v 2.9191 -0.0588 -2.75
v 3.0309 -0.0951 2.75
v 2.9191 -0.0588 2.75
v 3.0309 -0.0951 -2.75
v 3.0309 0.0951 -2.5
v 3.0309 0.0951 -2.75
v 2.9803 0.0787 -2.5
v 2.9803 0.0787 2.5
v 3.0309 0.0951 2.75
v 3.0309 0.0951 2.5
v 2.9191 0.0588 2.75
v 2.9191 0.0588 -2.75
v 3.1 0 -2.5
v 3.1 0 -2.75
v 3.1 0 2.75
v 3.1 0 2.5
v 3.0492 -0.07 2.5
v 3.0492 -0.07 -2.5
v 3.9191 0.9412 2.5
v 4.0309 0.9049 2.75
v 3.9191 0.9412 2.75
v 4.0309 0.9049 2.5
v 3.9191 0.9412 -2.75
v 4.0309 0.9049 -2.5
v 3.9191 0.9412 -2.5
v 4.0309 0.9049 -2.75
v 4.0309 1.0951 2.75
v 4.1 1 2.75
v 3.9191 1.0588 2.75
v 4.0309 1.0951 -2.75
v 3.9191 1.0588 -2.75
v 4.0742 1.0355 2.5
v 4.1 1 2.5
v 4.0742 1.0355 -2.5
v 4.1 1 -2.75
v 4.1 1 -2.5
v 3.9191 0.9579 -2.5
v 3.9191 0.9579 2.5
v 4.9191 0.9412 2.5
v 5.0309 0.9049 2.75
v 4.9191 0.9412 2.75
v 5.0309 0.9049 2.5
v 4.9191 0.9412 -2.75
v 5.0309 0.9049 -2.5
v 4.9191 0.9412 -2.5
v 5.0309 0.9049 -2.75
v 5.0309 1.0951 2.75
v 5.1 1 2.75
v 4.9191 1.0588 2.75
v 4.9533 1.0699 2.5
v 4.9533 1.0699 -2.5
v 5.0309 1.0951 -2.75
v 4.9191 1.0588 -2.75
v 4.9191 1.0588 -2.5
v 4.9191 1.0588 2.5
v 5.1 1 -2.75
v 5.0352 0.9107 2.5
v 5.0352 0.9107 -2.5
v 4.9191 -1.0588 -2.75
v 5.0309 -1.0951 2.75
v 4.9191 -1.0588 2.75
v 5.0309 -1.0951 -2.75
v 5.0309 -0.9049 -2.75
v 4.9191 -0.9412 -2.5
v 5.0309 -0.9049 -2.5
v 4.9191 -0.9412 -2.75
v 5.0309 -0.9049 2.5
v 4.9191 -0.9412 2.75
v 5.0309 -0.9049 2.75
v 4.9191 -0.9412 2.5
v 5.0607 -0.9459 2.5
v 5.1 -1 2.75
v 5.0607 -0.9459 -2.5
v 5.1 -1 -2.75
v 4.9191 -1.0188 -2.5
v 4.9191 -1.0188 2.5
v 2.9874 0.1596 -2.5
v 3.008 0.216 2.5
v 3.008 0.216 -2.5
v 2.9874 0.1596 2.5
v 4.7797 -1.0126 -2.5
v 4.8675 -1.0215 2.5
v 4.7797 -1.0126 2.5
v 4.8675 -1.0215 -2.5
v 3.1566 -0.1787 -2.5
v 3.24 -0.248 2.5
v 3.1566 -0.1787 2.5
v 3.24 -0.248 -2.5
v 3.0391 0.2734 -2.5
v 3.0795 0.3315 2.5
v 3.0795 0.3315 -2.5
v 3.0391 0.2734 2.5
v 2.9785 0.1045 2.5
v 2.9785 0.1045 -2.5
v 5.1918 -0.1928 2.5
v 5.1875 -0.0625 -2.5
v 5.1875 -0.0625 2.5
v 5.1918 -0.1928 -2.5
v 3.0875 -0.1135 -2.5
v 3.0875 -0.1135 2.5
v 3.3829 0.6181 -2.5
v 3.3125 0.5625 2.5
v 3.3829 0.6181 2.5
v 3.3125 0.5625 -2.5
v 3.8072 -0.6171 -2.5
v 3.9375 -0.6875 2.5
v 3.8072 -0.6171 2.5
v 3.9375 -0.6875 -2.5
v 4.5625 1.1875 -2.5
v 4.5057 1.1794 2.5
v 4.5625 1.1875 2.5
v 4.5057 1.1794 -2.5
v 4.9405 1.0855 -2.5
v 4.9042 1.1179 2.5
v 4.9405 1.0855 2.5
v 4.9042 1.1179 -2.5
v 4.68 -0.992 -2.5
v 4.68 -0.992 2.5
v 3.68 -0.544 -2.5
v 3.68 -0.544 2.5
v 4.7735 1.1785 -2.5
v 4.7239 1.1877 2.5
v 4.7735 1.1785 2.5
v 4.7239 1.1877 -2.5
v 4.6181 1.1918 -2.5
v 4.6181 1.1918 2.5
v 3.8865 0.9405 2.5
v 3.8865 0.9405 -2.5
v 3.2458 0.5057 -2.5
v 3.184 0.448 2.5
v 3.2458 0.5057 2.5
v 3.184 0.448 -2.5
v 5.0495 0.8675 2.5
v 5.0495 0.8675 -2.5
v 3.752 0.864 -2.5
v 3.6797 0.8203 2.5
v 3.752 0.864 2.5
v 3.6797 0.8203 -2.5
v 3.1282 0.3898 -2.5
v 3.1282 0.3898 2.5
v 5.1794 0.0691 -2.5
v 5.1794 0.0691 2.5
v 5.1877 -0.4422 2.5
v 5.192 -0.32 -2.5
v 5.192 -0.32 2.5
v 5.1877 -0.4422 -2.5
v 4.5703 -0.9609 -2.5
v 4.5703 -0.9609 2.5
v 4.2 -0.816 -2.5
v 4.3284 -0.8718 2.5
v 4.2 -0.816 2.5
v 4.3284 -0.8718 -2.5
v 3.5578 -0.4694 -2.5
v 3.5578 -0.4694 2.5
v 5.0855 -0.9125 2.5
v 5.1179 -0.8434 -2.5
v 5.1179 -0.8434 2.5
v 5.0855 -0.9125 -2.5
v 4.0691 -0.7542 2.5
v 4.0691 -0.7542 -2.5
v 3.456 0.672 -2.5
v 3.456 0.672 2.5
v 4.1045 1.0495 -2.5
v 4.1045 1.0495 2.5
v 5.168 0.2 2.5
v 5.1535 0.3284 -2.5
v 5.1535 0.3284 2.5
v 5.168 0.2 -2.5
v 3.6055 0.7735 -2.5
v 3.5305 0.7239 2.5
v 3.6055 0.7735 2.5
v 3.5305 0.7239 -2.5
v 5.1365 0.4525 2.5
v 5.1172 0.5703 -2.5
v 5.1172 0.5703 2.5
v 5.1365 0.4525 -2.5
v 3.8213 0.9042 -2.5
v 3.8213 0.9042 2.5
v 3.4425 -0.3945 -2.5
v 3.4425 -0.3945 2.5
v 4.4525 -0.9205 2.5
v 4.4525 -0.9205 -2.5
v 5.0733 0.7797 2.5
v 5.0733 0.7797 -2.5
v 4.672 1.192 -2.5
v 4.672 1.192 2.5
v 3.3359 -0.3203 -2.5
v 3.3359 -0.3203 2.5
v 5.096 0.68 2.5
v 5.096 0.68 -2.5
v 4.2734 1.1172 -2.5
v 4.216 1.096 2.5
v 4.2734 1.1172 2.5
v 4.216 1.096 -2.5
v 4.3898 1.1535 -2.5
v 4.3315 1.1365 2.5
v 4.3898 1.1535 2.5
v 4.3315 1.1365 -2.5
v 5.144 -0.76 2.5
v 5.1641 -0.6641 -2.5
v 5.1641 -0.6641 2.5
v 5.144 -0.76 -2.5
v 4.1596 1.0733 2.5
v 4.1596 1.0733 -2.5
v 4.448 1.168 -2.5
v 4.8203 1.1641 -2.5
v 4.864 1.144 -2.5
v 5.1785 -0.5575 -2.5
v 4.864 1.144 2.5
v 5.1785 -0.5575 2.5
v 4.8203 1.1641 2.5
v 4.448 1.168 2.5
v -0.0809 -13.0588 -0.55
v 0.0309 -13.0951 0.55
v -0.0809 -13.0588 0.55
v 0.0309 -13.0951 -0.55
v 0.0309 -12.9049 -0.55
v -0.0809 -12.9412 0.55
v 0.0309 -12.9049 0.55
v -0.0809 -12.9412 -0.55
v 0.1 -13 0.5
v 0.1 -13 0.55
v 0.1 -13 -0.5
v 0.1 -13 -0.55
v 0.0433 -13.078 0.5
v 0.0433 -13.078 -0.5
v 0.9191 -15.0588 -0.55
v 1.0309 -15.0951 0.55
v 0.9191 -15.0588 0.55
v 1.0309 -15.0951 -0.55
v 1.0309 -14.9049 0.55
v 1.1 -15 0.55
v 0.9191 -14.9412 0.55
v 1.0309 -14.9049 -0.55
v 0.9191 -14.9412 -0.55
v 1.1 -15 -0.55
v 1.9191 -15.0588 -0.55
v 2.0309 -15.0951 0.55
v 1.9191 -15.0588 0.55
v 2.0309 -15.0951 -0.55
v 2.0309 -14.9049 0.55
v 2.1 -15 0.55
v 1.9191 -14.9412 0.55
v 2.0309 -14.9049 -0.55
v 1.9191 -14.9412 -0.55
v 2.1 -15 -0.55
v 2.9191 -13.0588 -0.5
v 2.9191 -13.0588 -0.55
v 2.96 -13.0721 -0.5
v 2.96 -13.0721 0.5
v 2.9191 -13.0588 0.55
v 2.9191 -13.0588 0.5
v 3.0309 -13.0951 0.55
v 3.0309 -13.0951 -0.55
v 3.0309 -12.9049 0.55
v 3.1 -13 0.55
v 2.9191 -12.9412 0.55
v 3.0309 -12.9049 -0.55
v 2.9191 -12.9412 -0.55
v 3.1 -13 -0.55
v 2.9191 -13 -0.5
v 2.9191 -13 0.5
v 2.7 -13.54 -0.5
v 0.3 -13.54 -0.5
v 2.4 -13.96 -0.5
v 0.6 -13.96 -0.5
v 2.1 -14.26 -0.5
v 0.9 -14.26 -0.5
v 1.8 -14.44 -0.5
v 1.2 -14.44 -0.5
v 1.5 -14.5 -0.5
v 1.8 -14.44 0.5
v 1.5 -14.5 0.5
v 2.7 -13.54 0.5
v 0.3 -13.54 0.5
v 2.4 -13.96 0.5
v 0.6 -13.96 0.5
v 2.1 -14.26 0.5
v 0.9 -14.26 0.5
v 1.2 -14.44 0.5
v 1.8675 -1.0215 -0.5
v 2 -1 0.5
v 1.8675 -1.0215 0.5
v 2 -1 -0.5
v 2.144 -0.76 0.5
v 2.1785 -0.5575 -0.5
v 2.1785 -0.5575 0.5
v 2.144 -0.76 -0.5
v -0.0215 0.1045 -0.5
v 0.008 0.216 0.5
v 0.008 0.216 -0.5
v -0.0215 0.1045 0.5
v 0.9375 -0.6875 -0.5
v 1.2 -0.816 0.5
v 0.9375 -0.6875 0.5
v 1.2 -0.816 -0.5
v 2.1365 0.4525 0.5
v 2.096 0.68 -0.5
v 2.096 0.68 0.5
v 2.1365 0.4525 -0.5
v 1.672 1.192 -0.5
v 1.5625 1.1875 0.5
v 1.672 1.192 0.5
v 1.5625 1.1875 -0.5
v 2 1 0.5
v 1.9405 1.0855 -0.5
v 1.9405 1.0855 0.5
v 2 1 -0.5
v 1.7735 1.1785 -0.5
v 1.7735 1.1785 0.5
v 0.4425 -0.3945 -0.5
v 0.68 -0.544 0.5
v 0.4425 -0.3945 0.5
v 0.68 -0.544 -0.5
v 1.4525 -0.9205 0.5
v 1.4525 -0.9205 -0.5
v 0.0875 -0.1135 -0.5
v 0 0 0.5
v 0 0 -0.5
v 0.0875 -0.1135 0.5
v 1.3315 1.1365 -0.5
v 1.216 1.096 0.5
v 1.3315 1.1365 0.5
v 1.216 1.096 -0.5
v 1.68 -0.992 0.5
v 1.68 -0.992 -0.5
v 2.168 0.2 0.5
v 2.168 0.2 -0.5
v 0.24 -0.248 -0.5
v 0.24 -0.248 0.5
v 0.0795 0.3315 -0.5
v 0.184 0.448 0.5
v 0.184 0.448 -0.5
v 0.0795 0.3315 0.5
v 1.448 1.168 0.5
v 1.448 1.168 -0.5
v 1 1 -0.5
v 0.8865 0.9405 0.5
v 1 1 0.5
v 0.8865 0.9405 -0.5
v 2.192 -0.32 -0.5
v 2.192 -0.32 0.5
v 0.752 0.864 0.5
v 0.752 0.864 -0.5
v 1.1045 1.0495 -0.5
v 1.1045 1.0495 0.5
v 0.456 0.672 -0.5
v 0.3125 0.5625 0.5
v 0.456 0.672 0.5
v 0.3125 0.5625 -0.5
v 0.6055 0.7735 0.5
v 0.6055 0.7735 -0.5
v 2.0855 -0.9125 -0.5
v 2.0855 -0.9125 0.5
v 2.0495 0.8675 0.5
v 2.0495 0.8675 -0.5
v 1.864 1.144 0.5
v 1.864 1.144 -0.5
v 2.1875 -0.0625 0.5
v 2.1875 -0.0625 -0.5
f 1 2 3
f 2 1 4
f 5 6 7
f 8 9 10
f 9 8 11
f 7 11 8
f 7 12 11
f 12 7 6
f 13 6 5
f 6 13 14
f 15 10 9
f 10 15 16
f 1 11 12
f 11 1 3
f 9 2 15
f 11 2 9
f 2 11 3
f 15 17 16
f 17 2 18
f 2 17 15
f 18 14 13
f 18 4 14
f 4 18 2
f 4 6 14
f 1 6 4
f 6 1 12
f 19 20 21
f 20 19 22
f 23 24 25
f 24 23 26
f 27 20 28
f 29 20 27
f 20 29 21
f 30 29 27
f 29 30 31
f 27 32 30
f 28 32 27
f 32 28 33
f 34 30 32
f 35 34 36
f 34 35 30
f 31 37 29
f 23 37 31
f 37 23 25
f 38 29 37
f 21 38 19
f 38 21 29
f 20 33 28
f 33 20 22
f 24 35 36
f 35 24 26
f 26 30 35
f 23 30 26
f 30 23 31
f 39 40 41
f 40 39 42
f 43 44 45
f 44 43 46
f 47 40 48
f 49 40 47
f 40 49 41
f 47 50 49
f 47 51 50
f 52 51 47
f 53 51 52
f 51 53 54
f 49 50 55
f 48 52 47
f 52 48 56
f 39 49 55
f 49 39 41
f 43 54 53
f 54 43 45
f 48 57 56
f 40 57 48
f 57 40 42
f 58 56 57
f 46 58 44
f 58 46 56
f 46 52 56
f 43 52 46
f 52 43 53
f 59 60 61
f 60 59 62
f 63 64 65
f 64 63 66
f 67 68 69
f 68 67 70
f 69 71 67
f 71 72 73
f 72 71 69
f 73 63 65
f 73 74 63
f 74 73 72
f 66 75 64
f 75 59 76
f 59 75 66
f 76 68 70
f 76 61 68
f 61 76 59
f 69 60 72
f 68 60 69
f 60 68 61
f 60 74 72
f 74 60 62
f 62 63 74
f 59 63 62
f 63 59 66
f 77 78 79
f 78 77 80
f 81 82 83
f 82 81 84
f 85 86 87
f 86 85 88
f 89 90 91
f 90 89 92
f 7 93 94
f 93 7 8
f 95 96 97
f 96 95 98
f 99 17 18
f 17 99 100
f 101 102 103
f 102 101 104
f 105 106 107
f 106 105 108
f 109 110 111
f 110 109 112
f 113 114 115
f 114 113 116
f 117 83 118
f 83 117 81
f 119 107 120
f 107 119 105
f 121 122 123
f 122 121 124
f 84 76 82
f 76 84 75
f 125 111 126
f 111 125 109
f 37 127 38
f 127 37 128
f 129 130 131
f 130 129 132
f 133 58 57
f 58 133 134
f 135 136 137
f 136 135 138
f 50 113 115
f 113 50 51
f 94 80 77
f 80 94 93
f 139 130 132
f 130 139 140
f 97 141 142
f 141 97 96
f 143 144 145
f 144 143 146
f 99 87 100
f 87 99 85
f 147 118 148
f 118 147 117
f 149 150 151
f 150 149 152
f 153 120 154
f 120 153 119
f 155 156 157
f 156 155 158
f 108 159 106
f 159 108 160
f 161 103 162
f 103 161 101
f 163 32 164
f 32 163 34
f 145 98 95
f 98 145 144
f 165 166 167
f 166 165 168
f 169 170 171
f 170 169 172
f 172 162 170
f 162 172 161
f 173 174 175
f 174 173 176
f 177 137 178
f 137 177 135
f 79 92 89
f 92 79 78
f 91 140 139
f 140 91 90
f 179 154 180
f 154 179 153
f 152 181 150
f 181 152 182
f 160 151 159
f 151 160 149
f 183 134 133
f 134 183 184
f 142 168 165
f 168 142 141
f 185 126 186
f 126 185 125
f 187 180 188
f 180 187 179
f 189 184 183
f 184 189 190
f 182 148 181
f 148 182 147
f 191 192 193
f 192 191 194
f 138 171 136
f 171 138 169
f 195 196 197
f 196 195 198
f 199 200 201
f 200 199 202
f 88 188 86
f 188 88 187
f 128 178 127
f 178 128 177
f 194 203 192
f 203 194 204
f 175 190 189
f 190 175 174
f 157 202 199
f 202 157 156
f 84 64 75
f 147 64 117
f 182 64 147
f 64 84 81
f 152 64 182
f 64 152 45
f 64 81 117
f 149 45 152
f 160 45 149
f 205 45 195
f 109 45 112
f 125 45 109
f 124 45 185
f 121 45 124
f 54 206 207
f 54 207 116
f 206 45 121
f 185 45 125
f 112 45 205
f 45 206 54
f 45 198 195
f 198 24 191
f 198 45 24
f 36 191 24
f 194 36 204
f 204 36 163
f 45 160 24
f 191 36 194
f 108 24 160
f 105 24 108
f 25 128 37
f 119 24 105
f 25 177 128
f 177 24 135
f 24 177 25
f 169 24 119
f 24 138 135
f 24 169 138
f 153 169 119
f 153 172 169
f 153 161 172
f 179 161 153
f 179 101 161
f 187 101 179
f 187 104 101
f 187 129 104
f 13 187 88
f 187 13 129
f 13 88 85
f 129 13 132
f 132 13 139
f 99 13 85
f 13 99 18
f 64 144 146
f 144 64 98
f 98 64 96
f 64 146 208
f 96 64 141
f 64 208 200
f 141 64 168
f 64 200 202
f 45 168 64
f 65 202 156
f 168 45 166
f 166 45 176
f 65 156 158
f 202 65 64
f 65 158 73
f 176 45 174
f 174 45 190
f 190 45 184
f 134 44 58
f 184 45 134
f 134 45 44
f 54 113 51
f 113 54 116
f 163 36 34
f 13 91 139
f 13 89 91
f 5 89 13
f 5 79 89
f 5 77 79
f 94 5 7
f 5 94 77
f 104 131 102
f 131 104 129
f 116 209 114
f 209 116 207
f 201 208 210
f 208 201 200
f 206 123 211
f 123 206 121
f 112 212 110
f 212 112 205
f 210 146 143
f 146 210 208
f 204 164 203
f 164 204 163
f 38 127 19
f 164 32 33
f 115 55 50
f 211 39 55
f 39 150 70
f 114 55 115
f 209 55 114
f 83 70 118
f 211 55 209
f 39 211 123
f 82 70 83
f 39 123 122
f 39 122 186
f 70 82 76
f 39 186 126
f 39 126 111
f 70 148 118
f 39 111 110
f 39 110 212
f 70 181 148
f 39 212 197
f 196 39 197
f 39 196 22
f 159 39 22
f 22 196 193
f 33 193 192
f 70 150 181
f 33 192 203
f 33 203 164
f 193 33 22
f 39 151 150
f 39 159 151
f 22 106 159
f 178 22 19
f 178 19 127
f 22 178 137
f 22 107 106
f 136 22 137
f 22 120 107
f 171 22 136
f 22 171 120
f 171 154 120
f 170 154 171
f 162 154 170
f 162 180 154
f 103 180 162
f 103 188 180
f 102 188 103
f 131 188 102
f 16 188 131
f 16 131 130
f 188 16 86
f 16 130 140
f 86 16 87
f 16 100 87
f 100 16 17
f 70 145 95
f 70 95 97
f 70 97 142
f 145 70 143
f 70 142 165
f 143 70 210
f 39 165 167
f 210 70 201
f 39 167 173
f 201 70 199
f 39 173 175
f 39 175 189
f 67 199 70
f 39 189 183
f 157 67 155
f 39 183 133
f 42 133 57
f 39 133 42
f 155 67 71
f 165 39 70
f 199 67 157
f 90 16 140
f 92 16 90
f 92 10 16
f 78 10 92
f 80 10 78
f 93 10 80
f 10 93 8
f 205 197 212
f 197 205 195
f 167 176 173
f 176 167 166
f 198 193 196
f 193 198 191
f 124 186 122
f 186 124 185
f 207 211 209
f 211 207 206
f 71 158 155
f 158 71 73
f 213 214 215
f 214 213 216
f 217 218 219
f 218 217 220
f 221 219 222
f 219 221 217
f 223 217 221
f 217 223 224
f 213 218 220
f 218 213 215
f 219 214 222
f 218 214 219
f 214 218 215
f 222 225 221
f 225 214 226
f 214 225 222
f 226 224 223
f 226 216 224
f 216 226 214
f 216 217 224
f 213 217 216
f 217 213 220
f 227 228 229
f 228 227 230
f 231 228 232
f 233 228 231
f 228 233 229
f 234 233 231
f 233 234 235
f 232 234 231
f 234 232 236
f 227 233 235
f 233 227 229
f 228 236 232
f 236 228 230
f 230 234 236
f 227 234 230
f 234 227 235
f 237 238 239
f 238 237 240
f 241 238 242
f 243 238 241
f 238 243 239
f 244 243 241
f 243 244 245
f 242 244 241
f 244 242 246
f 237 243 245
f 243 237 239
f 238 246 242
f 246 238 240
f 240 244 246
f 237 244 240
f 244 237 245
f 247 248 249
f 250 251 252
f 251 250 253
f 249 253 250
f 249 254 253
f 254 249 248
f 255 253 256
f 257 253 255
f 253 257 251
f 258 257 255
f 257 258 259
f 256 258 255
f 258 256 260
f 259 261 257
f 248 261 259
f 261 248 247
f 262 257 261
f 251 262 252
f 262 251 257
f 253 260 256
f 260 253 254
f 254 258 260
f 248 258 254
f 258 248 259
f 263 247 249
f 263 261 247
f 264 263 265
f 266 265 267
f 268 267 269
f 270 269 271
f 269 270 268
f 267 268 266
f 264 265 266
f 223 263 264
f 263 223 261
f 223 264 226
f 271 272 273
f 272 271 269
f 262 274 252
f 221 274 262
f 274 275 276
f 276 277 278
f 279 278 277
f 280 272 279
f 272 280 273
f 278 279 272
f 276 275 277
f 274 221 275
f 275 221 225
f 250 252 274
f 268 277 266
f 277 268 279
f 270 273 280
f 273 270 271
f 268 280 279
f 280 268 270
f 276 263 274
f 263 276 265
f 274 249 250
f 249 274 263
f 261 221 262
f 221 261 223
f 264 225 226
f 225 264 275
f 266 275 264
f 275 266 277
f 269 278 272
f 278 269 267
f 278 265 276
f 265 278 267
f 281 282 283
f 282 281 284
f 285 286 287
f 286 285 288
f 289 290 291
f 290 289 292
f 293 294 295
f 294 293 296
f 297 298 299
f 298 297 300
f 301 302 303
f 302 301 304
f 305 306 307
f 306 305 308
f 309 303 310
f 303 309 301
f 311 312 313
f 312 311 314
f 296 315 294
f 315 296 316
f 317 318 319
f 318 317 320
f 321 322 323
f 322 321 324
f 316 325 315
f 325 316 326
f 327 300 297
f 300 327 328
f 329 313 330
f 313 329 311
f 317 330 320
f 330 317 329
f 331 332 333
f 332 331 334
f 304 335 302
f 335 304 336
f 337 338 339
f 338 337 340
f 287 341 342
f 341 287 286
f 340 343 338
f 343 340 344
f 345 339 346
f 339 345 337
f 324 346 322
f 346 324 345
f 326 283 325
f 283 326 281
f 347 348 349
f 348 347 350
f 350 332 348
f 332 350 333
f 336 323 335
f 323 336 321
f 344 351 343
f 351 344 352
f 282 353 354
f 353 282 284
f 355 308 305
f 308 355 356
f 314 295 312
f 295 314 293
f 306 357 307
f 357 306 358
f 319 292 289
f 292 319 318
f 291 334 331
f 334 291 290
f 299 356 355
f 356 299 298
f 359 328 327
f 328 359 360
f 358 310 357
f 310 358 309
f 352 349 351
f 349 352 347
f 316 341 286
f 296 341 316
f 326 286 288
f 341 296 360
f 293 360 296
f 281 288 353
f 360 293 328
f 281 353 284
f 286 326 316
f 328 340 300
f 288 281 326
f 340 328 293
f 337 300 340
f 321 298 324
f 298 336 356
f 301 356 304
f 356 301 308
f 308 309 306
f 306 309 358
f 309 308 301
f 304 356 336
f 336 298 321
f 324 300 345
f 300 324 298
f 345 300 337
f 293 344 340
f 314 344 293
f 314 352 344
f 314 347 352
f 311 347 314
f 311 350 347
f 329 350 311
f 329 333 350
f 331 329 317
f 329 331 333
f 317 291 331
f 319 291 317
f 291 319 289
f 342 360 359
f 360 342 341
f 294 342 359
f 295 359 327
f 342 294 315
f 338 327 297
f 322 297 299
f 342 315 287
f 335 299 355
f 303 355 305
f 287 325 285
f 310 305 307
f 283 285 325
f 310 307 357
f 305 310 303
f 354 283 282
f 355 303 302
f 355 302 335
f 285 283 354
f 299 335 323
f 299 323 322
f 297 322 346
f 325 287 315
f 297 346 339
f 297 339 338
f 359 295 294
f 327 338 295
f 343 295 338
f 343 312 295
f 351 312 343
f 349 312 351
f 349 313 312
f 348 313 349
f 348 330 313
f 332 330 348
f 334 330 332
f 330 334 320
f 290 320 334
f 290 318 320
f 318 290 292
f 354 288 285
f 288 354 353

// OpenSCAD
// Generated by SolidPython 1.0.5 on 2021-06-01 16:29:02


union() {
	linear_extrude(center = true, height = 1) {
		polygon(points = [[0.0000000000, 0.0000000000], [-0.0215000000, 0.1045000000], [0.0080000000, 0.2160000000], [0.0795000000, 0.3315000000], [0.1840000000, 0.4480000000], [0.3125000000, 0.5625000000], [0.4560000000, 0.6720000000], [0.6055000000, 0.7735000000], [0.7520000000, 0.8640000000], [0.8865000000, 0.9405000000], [1.0000000000, 1.0000000000], [1.1045000000, 1.0495000000], [1.2160000000, 1.0960000000], [1.3315000000, 1.1365000000], [1.4480000000, 1.1680000000], [1.5625000000, 1.1875000000], [1.6720000000, 1.1920000000], [1.7735000000, 1.1785000000], [1.8640000000, 1.1440000000], [1.9405000000, 1.0855000000], [2.0000000000, 1.0000000000], [2.0495000000, 0.8675000000], [2.0960000000, 0.6800000000], [2.1365000000, 0.4525000000], [2.1680000000, 0.2000000000], [2.1875000000, -0.0625000000], [2.1920000000, -0.3200000000], [2.1785000000, -0.5575000000], [2.1440000000, -0.7600000000], [2.0855000000, -0.9125000000], [2.0000000000, -1.0000000000], [1.8675000000, -1.0215000000], [1.6800000000, -0.9920000000], [1.4525000000, -0.9205000000], [1.2000000000, -0.8160000000], [0.9375000000, -0.6875000000], [0.6800000000, -0.5440000000], [0.4425000000, -0.3945000000], [0.2400000000, -0.2480000000], [0.0875000000, -0.1135000000], [0.0000000000, 0.0000000000]]);
	}
	translate(v = [3, 0, 0]) {
		union() {
			linear_extrude(center = true, height = 5) {
				polygon(points = [[0.0000000000, 0.0000000000], [-0.0176875000, 0.0511875000], [-0.0215000000, 0.1045000000], [-0.0125625000, 0.1595625000], [0.0080000000, 0.2160000000], [0.0390625000, 0.2734375000], [0.0795000000, 0.3315000000], [0.1281875000, 0.3898125000], [0.1840000000, 0.4480000000], [0.2458125000, 0.5056875000], [0.3125000000, 0.5625000000], [0.3829375000, 0.6180625000], [0.4560000000, 0.6720000000], [0.5305625000, 0.7239375000], [0.6055000000, 0.7735000000], [0.6796875000, 0.8203125000], [0.7520000000, 0.8640000000], [0.8213125000, 0.9041875000], [0.8865000000, 0.9405000000], [0.9464375000, 0.9725625000], [1.0000000000, 1.0000000000], [1.0511875000, 1.0249375000], [1.1045000000, 1.0495000000], [1.1595625000, 1.0733125000], [1.2160000000, 1.0960000000], [1.2734375000, 1.1171875000], [1.3315000000, 1.1365000000], [1.3898125000, 1.1535625000], [1.4480000000, 1.1680000000], [1.5056875000, 1.1794375000], [1.5625000000, 1.1875000000], [1.6180625000, 1.1918125000], [1.6720000000, 1.1920000000], [1.7239375000, 1.1876875000], [1.7735000000, 1.1785000000], [1.8203125000, 1.1640625000], [1.8640000000, 1.1440000000], [1.9041875000, 1.1179375000], [1.9405000000, 1.0855000000], [1.9725625000, 1.0463125000], [2.0000000000, 1.0000000000], [2.0249375000, 0.9415625000], [2.0495000000, 0.8675000000], [2.0733125000, 0.7796875000], [2.0960000000, 0.6800000000], [2.1171875000, 0.5703125000], [2.1365000000, 0.4525000000], [2.1535625000, 0.3284375000], [2.1680000000, 0.2000000000], [2.1794375000, 0.0690625000], [2.1875000000, -0.0625000000], [2.1918125000, -0.1928125000], [2.1920000000, -0.3200000000], [2.1876875000, -0.4421875000], [2.1785000000, -0.5575000000], [2.1640625000, -0.6640625000], [2.1440000000, -0.7600000000], [2.1179375000, -0.8434375000], [2.0855000000, -0.9125000000], [2.0463125000, -0.9653125000], [2.0000000000, -1.0000000000], [1.9415625000, -1.0176875000], [1.8675000000, -1.0215000000], [1.7796875000, -1.0125625000], [1.6800000000, -0.9920000000], [1.5703125000, -0.9609375000], [1.4525000000, -0.9205000000], [1.3284375000, -0.8718125000], [1.2000000000, -0.8160000000], [1.0690625000, -0.7541875000], [0.9375000000, -0.6875000000], [0.8071875000, -0.6170625000], [0.6800000000, -0.5440000000], [0.5578125000, -0.4694375000], [0.4425000000, -0.3945000000], [0.3359375000, -0.3203125000], [0.2400000000, -0.2480000000], [0.1565625000, -0.1786875000], [0.0875000000, -0.1135000000], [0.0346875000, -0.0535625000], [0.0000000000, 0.0000000000]]);
			}
			color(alpha = 1.0000000000, c = [1, 0, 0]) {
				translate(v = [0, 0, 0]) {
					cylinder(center = true, h = 5.5000000000, r = 0.1000000000);
				}
				translate(v = [1, 1, 0]) {
					cylinder(center = true, h = 5.5000000000, r = 0.1000000000);
				}
				translate(v = [2, 1, 0]) {
					cylinder(center = true, h = 5.5000000000, r = 0.1000000000);
				}
				translate(v = [2, -1, 0]) {
					cylinder(center = true, h = 5.5000000000, r = 0.1000000000);
				}
			}
		}
	}
	translate(v = [0, -4, 0]) {
		union() {
			polygon(points = [[0.0000000000, 0.0000000000], [-0.0215000000, 0.1045000000], [0.0080000000, 0.2160000000], [0.0795000000, 0.3315000000], [0.1840000000, 0.4480000000], [0.3125000000, 0.5625000000], [0.4560000000, 0.6720000000], [0.6055000000, 0.7735000000], [0.7520000000, 0.8640000000], [0.8865000000, 0.9405000000], [1.0000000000, 1.0000000000], [1.1045000000, 1.0495000000], [1.2160000000, 1.0960000000], [1.3315000000, 1.1365000000], [1.4480000000, 1.1680000000], [1.5625000000, 1.1875000000], [1.6720000000, 1.1920000000], [1.7735000000, 1.1785000000], [1.8640000000, 1.1440000000], [1.9405000000, 1.0855000000], [2.0000000000, 1.0000000000], [2.0495000000, 0.8675000000], [2.0960000000, 0.6800000000], [2.1365000000, 0.4525000000], [2.1680000000, 0.2000000000], [2.1875000000, -0.0625000000], [2.1920000000, -0.3200000000], [2.1785000000, -0.5575000000], [2.1440000000, -0.7600000000], [2.0855000000, -0.9125000000], [2.0000000000, -1.0000000000], [1.8675000000, -1.0215000000], [1.6800000000, -0.9920000000], [1.4525000000, -0.9205000000], [1.2000000000, -0.8160000000], [0.9375000000, -0.6875000000], [0.6800000000, -0.5440000000], [0.4425000000, -0.3945000000], [0.2400000000, -0.2480000000], [0.0875000000, -0.1135000000], [0.0000000000, 0.0000000000]]);
			color(alpha = 1.0000000000, c = [1, 0, 0]) {
				translate(v = [0, 0, 0]) {
					circle(r = 0.1000000000);
				}
				translate(v = [1, 1, 0]) {
					circle(r = 0.1000000000);
				}
				translate(v = [2, 1, 0]) {
					circle(r = 0.1000000000);
				}
				translate(v = [2, -1, 0]) {
					circle(r = 0.1000000000);
				}
			}
			translate(v = [3, 0, 0]) {
				union() {
					polygon(points = [[0.0000000000, 0.0000000000], [0.0190000000, 0.0235000000], [0.0720000000, 0.0880000000], [0.1530000000, 0.1845000000], [0.2560000000, 0.3040000000], [0.3750000000, 0.4375000000], [0.5040000000, 0.5760000000], [0.6370000000, 0.7105000000], [0.7680000000, 0.8320000000], [0.8910000000, 0.9315000000], [1.0000000000, 1.0000000000], [1.1045000000, 1.0495000000], [1.2160000000, 1.0960000000], [1.3315000000, 1.1365000000], [1.4480000000, 1.1680000000], [1.5625000000, 1.1875000000], [1.6720000000, 1.1920000000], [1.7735000000, 1.1785000000], [1.8640000000, 1.1440000000], [1.9405000000, 1.0855000000], [2.0000000000, 1.0000000000], [2.0405000000, 0.8630000000], [2.0640000000, 0.6640000000], [2.0735000000, 0.4210000000], [2.0720000000, 0.1520000000], [2.0625000000, -0.1250000000], [2.0480000000, -0.3920000000], [2.0315000000, -0.6310000000], [2.0160000000, -0.8240000000], [2.0045000000, -0.9530000000], [2.0000000000, -1.0000000000]]);
					color(alpha = 1.0000000000, c = [1, 0, 0]) {
						translate(v = [0, 0, 0]) {
							circle(r = 0.1000000000);
						}
						translate(v = [1, 1, 0]) {
							circle(r = 0.1000000000);
						}
						translate(v = [2, 1, 0]) {
							circle(r = 0.1000000000);
						}
						translate(v = [2, -1, 0]) {
							circle(r = 0.1000000000);
						}
					}
				}
			}
			translate(v = [10, 0, 0]) {
				union() {
					polygon(points = [[0.0000000000, 0.0000000000], [0.1405000000, 0.0640000000], [0.2640000000, 0.1520000000], [0.3735000000, 0.2580000000], [0.4720000000, 0.3760000000], [0.5625000000, 0.5000000000], [0.6480000000, 0.6240000000], [0.7315000000, 0.7420000000], [0.8160000000, 0.8480000000], [0.9045000000, 0.9360000000], [1.0000000000, 1.0000000000], [1.1045000000, 1.0495000000], [1.2160000000, 1.0960000000], [1.3315000000, 1.1365000000], [1.4480000000, 1.1680000000], [1.5625000000, 1.1875000000], [1.6720000000, 1.1920000000], [1.7735000000, 1.1785000000], [1.8640000000, 1.1440000000], [1.9405000000, 1.0855000000], [2.0000000000, 1.0000000000], [2.0270000000, 0.8720000000], [2.0160000000, 0.6960000000], [1.9790000000, 0.4840000000], [1.9280000000, 0.2480000000], [1.8750000000, 0.0000000000], [1.8320000000, -0.2480000000], [1.8110000000, -0.4840000000], [1.8240000000, -0.6960000000], [1.8830000000, -0.8720000000], [2.0000000000, -1.0000000000]]);
					color(alpha = 1.0000000000, c = [1, 0, 0]) {
						translate(v = [-2, 0, 0]) {
							circle(r = 0.1000000000);
						}
						translate(v = [0, 0, 0]) {
							circle(r = 0.1000000000);
						}
						translate(v = [1, 1, 0]) {
							circle(r = 0.1000000000);
						}
						translate(v = [2, 1, 0]) {
							circle(r = 0.1000000000);
						}
						translate(v = [2, -1, 0]) {
							circle(r = 0.1000000000);
						}
						translate(v = [5, -1, 0]) {
							circle(r = 0.1000000000);
						}
					}
				}
			}
		}
	}
	translate(v = [0, -12, 0]) {
		union() {
			polygon(points = [[0, 6], [0.4000000000, 6.0000000000], [0.4000000000, 5.9998000000], [0.4000000000, 5.9984000000], [0.4000000000, 5.9946000000], [0.4000000000, 5.9872000000], [0.4000000000, 5.9750000000], [0.4000000000, 5.9568000000], [0.4000000000, 5.9314000000], [0.4000000000, 5.8976000000], [0.4000000000, 5.8542000000], [0.4000000000, 5.8000000000], [0.3973000000, 5.7324000000], [0.3904000000, 5.6512000000], [0.3811000000, 5.5588000000], [0.3712000000, 5.4576000000], [0.3625000000, 5.3500000000], [0.3568000000, 5.2384000000], [0.3559000000, 5.1252000000], [0.3616000000, 5.0128000000], [0.3757000000, 4.9036000000], [0.4000000000, 4.8000000000], [0.4384000000, 4.7058500000], [0.4912000000, 4.6208000000], [0.5548000000, 4.5409500000], [0.6256000000, 4.4624000000], [0.7000000000, 4.3812500000], [0.7744000000, 4.2936000000], [0.8452000000, 4.1955500000], [0.9088000000, 4.0832000000], [0.9616000000, 3.9526500000], [1.0000000000, 3.8000000000], [1.0243000000, 3.6168000000], [1.0384000000, 3.4024000000], [1.0441000000, 3.1646000000], [1.0432000000, 2.9112000000], [1.0375000000, 2.6500000000], [1.0288000000, 2.3888000000], [1.0189000000, 2.1354000000], [1.0096000000, 1.8976000000], [1.0027000000, 1.6832000000], [1.0000000000, 1.5000000000], [1.0022500000, 1.3451000000], [1.0080000000, 1.2088000000], [1.0157500000, 1.0887000000], [1.0240000000, 0.9824000000], [1.0312500000, 0.8875000000], [1.0360000000, 0.8016000000], [1.0367500000, 0.7223000000], [1.0320000000, 0.6472000000], [1.0202500000, 0.5739000000], [1.0000000000, 0.5000000000], [0.9702500000, 0.4275000000], [0.9320000000, 0.3600000000], [0.8867500000, 0.2975000000], [0.8360000000, 0.2400000000], [0.7812500000, 0.1875000000], [0.7240000000, 0.1400000000], [0.6657500000, 0.0975000000], [0.6080000000, 0.0600000000], [0.5522500000, 0.0275000000], [0.5000000000, 0.0000000000], [0.4455000000, -0.0202500000], [0.3840000000, -0.0320000000], [0.3185000000, -0.0367500000], [0.2520000000, -0.0360000000], [0.1875000000, -0.0312500000], [0.1280000000, -0.0240000000], [0.0765000000, -0.0157500000], [0.0360000000, -0.0080000000], [0.0095000000, -0.0022500000], [0.0000000000, 0.0000000000]]);
			mirror(v = [1, 0]) {
				polygon(points = [[0, 6], [0.4000000000, 6.0000000000], [0.4000000000, 5.9998000000], [0.4000000000, 5.9984000000], [0.4000000000, 5.9946000000], [0.4000000000, 5.9872000000], [0.4000000000, 5.9750000000], [0.4000000000, 5.9568000000], [0.4000000000, 5.9314000000], [0.4000000000, 5.8976000000], [0.4000000000, 5.8542000000], [0.4000000000, 5.8000000000], [0.3973000000, 5.7324000000], [0.3904000000, 5.6512000000], [0.3811000000, 5.5588000000], [0.3712000000, 5.4576000000], [0.3625000000, 5.3500000000], [0.3568000000, 5.2384000000], [0.3559000000, 5.1252000000], [0.3616000000, 5.0128000000], [0.3757000000, 4.9036000000], [0.4000000000, 4.8000000000], [0.4384000000, 4.7058500000], [0.4912000000, 4.6208000000], [0.5548000000, 4.5409500000], [0.6256000000, 4.4624000000], [0.7000000000, 4.3812500000], [0.7744000000, 4.2936000000], [0.8452000000, 4.1955500000], [0.9088000000, 4.0832000000], [0.9616000000, 3.9526500000], [1.0000000000, 3.8000000000], [1.0243000000, 3.6168000000], [1.0384000000, 3.4024000000], [1.0441000000, 3.1646000000], [1.0432000000, 2.9112000000], [1.0375000000, 2.6500000000], [1.0288000000, 2.3888000000], [1.0189000000, 2.1354000000], [1.0096000000, 1.8976000000], [1.0027000000, 1.6832000000], [1.0000000000, 1.5000000000], [1.0022500000, 1.3451000000], [1.0080000000, 1.2088000000], [1.0157500000, 1.0887000000], [1.0240000000, 0.9824000000], [1.0312500000, 0.8875000000], [1.0360000000, 0.8016000000], [1.0367500000, 0.7223000000], [1.0320000000, 0.6472000000], [1.0202500000, 0.5739000000], [1.0000000000, 0.5000000000], [0.9702500000, 0.4275000000], [0.9320000000, 0.3600000000], [0.8867500000, 0.2975000000], [0.8360000000, 0.2400000000], [0.7812500000, 0.1875000000], [0.7240000000, 0.1400000000], [0.6657500000, 0.0975000000], [0.6080000000, 0.0600000000], [0.5522500000, 0.0275000000], [0.5000000000, 0.0000000000], [0.4455000000, -0.0202500000], [0.3840000000, -0.0320000000], [0.3185000000, -0.0367500000], [0.2520000000, -0.0360000000], [0.1875000000, -0.0312500000], [0.1280000000, -0.0240000000], [0.0765000000, -0.0157500000], [0.0360000000, -0.0080000000], [0.0095000000, -0.0022500000], [0.0000000000, 0.0000000000]]);
			}
			color(alpha = 1.0000000000, c = [1, 0, 0]) {
				translate(v = [0.4000000000, 6, 0]) {
					circle(r = 0.0500000000);
				}
				translate(v = [0.4000000000, 5.8000000000, 0]) {
					circle(r = 0.0500000000);
				}
				translate(v = [0.4000000000, 4.8000000000, 0]) {
					circle(r = 0.0500000000);
				}
				translate(v = [1.0000000000, 3.8000000000, 0]) {
					circle(r = 0.0500000000);
				}
				translate(v = [1.0000000000, 1.5000000000, 0]) {
					circle(r = 0.0500000000);
				}
				translate(v = [1.0000000000, 0.5000000000, 0]) {
					circle(r = 0.0500000000);
				}
				translate(v = [0.5000000000, 0, 0]) {
					circle(r = 0.0500000000);
				}
				translate(v = [0, 0, 0]) {
					circle(r = 0.0500000000);
				}
			}
		}
	}
	translate(v = [0, -16, 0]) {
		union() {
			linear_extrude(center = true, height = 1) {
				polygon(points = [[0.0000000000, 3.0000000000], [0.3000000000, 2.4600000000], [0.6000000000, 2.0400000000], [0.9000000000, 1.7400000000], [1.2000000000, 1.5600000000], [1.5000000000, 1.5000000000], [1.8000000000, 1.5600000000], [2.1000000000, 1.7400000000], [2.4000000000, 2.0400000000], [2.7000000000, 2.4600000000], [3.0000000000, 3.0000000000]]);
			}
			color(alpha = 1.0000000000, c = [1, 0, 0]) {
				translate(v = [0, 3, 0]) {
					cylinder(center = true, h = 1.1000000000, r = 0.1000000000);
				}
				translate(v = [1, 1, 0]) {
					cylinder(center = true, h = 1.1000000000, r = 0.1000000000);
				}
				translate(v = [2, 1, 0]) {
					cylinder(center = true, h = 1.1000000000, r = 0.1000000000);
				}
				translate(v = [3, 3, 0]) {
					cylinder(center = true, h = 1.1000000000, r = 0.1000000000);
				}
			}
		}
	}
	translate(v = [0, -20, 0]) {
		union() {
			polygon(points = [[0.0000000000, 0.0000000000], [0.1500000000, 0.2636250000], [0.3000000000, 0.4590000000], [0.4500000000, 0.5928750000], [0.6000000000, 0.6720000000], [0.7500000000, 0.7031250000], [0.9000000000, 0.6930000000], [1.0500000000, 0.6483750000], [1.2000000000, 0.5760000000], [1.3500000000, 0.4826250000], [1.5000000000, 0.3750000000], [1.6500000000, 0.2598750000], [1.8000000000, 0.1440000000], [1.9500000000, 0.0341250000], [2.1000000000, -0.0630000000], [2.2500000000, -0.1406250000], [2.4000000000, -0.1920000000], [2.5500000000, -0.2103750000], [2.7000000000, -0.1890000000], [2.8500000000, -0.1211250000], [3.0000000000, 0.0000000000], [2, -2], [1, -2]]);
			color(alpha = 1.0000000000, c = [1, 0, 0]) {
				translate(v = [0, 0, 0]) {
					circle(r = 0.1500000000);
				}
				translate(v = [1, 2, 0]) {
					circle(r = 0.1500000000);
				}
				translate(v = [2, -1, 0]) {
					circle(r = 0.1500000000);
				}
				translate(v = [3, 0, 0]) {
					circle(r = 0.1500000000);
				}
			}
		}
	}
}
/***********************************************
*********      SolidPython code:      **********
************************************************
 
#! /usr/bin/env python
import os
import sys
from solid import *
from solid.utils import Red, right, forward, back

from solid.splines import catmull_rom_points, catmull_rom_polygon, control_points
from solid.splines import bezier_polygon, bezier_points
from euclid3 import Vector2, Vector3, Point2, Point3

def assembly():
    # Catmull-Rom Splines
    a = basic_catmull_rom()                         # Top row in OpenSCAD output
    a += back(4)(catmull_rom_spline_variants())     # Row 2
    a += back(12)(bottle_shape(width=2, height=6))  # Row 3, the bottle shape

    # # TODO: include examples for 3D surfaces:
    # a += back(16)(catmull_rom_patches())
    # a += back(20)(catmull_rom_prism())
    # a += back(24)(catmull_rom_prism_smooth())

    # Bezier Splines
    a += back(16)(basic_bezier())                   # Row 4
    a += back(20)(bezier_points_variants())         # Row 5
    return a

def basic_catmull_rom():
    points = [
        Point2(0,0),
        Point2(1,1),
        Point2(2,1),
        Point2(2,-1),
    ]
    # In its simplest form, catmull_rom_polygon() will just make a C1-continuous
    # closed shape. Easy.
    shape_easy = catmull_rom_polygon(points)
    # There are some other options as well...
    shape = catmull_rom_polygon(points, subdivisions=20, extrude_height=5, show_controls=True)
    return shape_easy + right(3)(shape)

def catmull_rom_spline_variants():
    points = [
        Point2(0,0),
        Point2(1,1),
        Point2(2,1),
        Point2(2,-1),
    ]
    controls = control_points(points)

    # By default, catmull_rom_points() will return a closed smooth shape
    curve_points_closed = catmull_rom_points(points, close_loop=True)

    # If `close_loop` is False, it will return only points between the start and
    # end control points, and make a best guess about tangents for the first and last segments
    curve_points_open   = catmull_rom_points(points, close_loop=False)
    
    # By specifying start_tangent and end_tangent, you can change a shape 
    # significantly. This is similar to what you might do with Illustrator's Pen Tool.
    # Try changing these vectors to see the effects this has on the rightmost curve in the example
    start_tangent = Vector2(-2, 0)
    end_tangent = Vector2(3, 0)
    tangent_pts = [points[0] + start_tangent, *points, points[-1] + end_tangent]
    tangent_controls = control_points(tangent_pts)
    curve_points_tangents = catmull_rom_points(points, close_loop=False, 
                                start_tangent=start_tangent, end_tangent=end_tangent)

    closed = polygon(curve_points_closed) + controls
    opened = polygon(curve_points_open) + controls
    tangents = polygon(curve_points_tangents) + tangent_controls

    a = closed + right(3)(opened) + right(10)(tangents)

    return a

def catmull_rom_patches():
    # TODO: write this
    pass

def catmull_rom_prism():
    # TODO: write this
    pass

def catmull_rom_prism_smooth():
    # TODO: write this
    pass

def bottle_shape(width: float, height: float, neck_width:float=None, neck_height:float=None):
    if neck_width == None:
        neck_width = width * 0.4
    
    if neck_height == None:
        neck_height = height * 0.2

    w2 = width/2
    nw2 = neck_width/2
    h = height
    nh = neck_height

    corner_rad = 0.5

    # Add extra tangent points near curves to keep cubics from going crazy. 
    # Try taking some of these out and see how this affects the final shape
    points = [
        Point2(nw2, h),
        Point2(nw2, h-nh + 1),      # <- extra tangent
        Point2(nw2, h - nh),    
        Point2(w2, h-nh-h/6),       # <- extra tangent
        Point2(w2, corner_rad + 1), # <- extra tangent
        Point2(w2, corner_rad),
        Point2(w2-corner_rad, 0),
        Point2(0,0),
    ]
    # Use catmull_rom_points() when you don't want all corners in a polygon 
    # smoothed out or want to combine the curve with other shapes. 
    # Extra points can then be added to the list you get back
    cr_points = catmull_rom_points(points)

    # Insert a point at the top center of the bottle at the beginning of the 
    # points list. This is how the bottle has a sharp right angle corner at the 
    # sides of the neck; otherwise we'd have to insert several extra control 
    # points to make a sharp corner
    cr_points.insert(0, (0,h))
    
    # Make OpenSCAD polygons out of the shapes once all points are calculated
    a = polygon(cr_points) 
    a += mirror(v=(1,0))(a)

    # Show control points. These aren't required for anything, but seeing them
    # makes refining a curve much easier
    controls = control_points(points)
    a += controls
    return a

def basic_bezier():
    # A basic cubic Bezier curve will pass through its first and last 
    # points, but not through the central control points
    controls = [
        Point2(0, 3),
        Point2(1, 1),
        Point2(2, 1),
        Point2(3, 3)
    ]
    shape = bezier_polygon(controls, show_controls=True)
    return shape

def bezier_points_variants():
    controls = [
        Point2(0,0),
        Point2(1,2),
        Point2(2, -1),
        Point2(3,0),
    ]
    points = bezier_points(controls, subdivisions=20)
    # For non-smooth curves, add extra points
    points += [
        Point2(2, -2),
        Point2(1, -2)
    ]
    shape = polygon(points) + control_points(controls, extrude_height=0)
    return shape


if __name__ == '__main__':
    out_dir = sys.argv[1] if len(sys.argv) > 1 else os.curdir

    a = assembly()

    out_path = scad_render_to_file(a, out_dir=out_dir, include_orig_code=True)
    print(f"{__file__}: SCAD file written to: \n{out_path}")

 
 
************************************************/
